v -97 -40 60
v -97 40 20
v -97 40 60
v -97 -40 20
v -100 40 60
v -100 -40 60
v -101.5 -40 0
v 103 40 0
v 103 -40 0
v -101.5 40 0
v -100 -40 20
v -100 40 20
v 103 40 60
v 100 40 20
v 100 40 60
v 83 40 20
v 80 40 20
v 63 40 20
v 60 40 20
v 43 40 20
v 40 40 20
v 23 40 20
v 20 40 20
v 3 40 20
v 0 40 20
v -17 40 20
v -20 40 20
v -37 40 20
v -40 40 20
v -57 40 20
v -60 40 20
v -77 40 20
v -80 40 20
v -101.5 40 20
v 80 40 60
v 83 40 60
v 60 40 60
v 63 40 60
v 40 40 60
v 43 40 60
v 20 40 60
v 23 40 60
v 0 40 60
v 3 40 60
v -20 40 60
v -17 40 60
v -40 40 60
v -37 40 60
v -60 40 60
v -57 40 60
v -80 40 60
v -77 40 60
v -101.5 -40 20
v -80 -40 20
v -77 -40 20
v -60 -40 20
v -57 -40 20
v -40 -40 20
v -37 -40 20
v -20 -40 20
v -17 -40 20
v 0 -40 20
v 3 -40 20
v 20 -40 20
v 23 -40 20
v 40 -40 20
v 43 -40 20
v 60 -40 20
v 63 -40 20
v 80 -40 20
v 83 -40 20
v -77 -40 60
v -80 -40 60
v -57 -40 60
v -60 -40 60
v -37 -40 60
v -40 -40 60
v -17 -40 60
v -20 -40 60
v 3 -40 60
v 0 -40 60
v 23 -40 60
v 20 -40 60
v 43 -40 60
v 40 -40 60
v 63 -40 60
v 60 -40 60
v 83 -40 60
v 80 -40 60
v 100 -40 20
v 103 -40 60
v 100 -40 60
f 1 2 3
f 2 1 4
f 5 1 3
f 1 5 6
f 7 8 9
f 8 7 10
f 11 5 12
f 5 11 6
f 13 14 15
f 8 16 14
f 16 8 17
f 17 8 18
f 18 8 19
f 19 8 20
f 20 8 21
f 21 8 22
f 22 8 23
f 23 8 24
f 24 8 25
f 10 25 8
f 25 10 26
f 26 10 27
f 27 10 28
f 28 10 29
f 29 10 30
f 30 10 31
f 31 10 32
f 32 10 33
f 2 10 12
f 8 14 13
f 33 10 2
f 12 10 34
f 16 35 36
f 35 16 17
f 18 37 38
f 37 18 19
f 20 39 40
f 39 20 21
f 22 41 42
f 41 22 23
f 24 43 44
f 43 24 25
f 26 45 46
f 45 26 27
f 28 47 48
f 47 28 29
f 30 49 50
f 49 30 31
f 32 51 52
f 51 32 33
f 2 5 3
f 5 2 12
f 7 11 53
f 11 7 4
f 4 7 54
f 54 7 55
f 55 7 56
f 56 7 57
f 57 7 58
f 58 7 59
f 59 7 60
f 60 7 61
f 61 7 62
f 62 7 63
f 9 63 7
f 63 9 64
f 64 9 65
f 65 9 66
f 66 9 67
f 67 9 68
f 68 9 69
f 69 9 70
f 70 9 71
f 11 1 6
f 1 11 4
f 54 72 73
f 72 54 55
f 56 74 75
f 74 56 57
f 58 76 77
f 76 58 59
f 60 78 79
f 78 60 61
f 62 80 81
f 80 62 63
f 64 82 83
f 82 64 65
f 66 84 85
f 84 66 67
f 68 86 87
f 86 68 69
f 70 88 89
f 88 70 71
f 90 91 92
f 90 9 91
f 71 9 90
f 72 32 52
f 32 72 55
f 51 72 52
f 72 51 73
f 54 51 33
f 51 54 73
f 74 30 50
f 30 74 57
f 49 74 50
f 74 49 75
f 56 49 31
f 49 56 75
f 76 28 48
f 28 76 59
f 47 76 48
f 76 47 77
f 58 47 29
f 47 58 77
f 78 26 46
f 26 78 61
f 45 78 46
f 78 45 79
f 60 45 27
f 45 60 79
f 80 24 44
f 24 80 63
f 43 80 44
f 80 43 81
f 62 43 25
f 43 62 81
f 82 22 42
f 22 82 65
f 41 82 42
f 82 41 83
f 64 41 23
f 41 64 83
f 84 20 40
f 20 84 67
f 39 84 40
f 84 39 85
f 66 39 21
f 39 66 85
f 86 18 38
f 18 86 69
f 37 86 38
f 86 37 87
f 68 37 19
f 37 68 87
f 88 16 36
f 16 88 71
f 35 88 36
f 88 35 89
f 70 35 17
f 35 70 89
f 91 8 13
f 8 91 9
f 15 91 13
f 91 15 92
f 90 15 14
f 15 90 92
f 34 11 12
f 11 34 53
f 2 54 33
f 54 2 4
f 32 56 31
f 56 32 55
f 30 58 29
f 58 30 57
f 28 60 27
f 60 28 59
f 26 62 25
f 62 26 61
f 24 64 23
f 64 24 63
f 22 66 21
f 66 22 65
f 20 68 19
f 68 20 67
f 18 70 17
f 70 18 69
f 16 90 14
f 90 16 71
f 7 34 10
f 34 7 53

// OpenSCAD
// --- Parameters ---
// Base dimensions
base_length = 203;       // X dimension of the base
base_width = 80;         // Y dimension of the base
base_height = 20;        // Z dimension of the base

// Cradle dimensions (for 90mm Petri dish)
dish_radius = 46;        // Radius of the cylinder cutting the cradle
cradle_axis_y = 0;       // Y position of the cylinder axis
cradle_axis_z = 52;      // Z position of the cylinder axis
cradle_depth_offset = 1; // Extra depth for boolean subtraction

// Divider dimensions
num_dividers = 11;       // Number of vertical plates
divider_thickness = 3;   // Thickness of each divider (X direction)
divider_height = 60;     // Height of dividers (Z direction)
divider_width = 80;      // Width of dividers (Y direction)
divider_spacing = 20;    // Distance between divider centers (X direction)
divider_start_x = -100;  // Starting X position for the first divider

// Resolution
fn_val = 64;             // Smoothness for cylinders

// --- Implementation ---

// The part is built in the print orientation: rests on XY plane at Z=0.
// The base is centered on X and Y.

union() {
    // 1. The Base Block
    translate([-base_length/2, -base_width/2, 0])
        cube([base_length, base_width, base_height]);

    // 2. The Divider Plates
    // We use a loop to place 11 dividers.
    // The dividers are "solid", meaning they are not cut by the cradle.
    // To ensure the cradle doesn't cut through them, we place them in a union
    // with the base, but the cradle subtraction must happen AFTER or 
    // we must ensure the dividers are not part of the subtraction.
    // The prompt says "the cradle is not cut through them".
    // Therefore, we calculate the dividers separately and union them.
    
    for (i = [0 : num_dividers - 1]) {
        translate([divider_start_x + (i * divider_spacing), -divider_width/2, 0])
            cube([divider_thickness, divider_width, divider_height]);
    }
}

// 3. The Cradle Cutout
// The cradle is a cylinder subtracted from the assembly.
// To ensure the cradle does NOT cut through the dividers, we must 
// subtract the cradle ONLY from the base, or use a logic where 
// the dividers are added back. 
// However, the prompt says "the cradle is not cut through them".
// The most robust way to model this is to create the base, subtract the cradle,
// then union the dividers.

// Let's re-structure the logic to follow the prompt's physical description:
// "A curved cradle... is cut along its whole length... the cradle is not cut through [the dividers]"

// Corrected Modeling Strategy:
// Part = (Base - Cradle) + Dividers

// We will use a module to keep it clean.
// Since I cannot use modules to redefine the whole structure easily in one block 
// without repeating code, I will use a single difference() block for the base 
// and then union the dividers.

// RE-WRITING THE MAIN BLOCK FOR LOGICAL ACCURACY:

// We'll use a temporary variable approach to ensure the dividers are not cut.
// We define the base with the cradle cut out, then union the dividers.

// Note: The prompt says the base is 20mm tall, but the cradle bottoms out at z=6.
// This means the cradle cuts into the base.

// Final Construction:
// (Base - Cradle) UNION Dividers

difference() {
    // The Base
    translate([-base_length/2, -base_width/2, 0])
        cube([base_length, base_width, base_height]);
    
    // The Cradle (Cylinder)
    // Axis runs along X, so we rotate the cylinder.
    // Cylinder is infinite in X for the cut, so we make it longer than the base.
    translate([0, cradle_axis_y, cradle_axis_z])
        rotate([0, 90, 0])
            cylinder(h = base_length + 2, r = dish_radius, center = true, $fn = fn_val);
}

// Add the dividers on top of the base/cradle assembly
// They are placed from z=0 to z=60.
// Since they are "solid" and "the cradle is not cut through them", 
// they must be unioned AFTER the cradle is subtracted from the base.
// However, the dividers start at z=0. If they are "not cut", 
// they must exist as full blocks.

// Wait, if the dividers are "not cut through" by the cradle, 
// and the cradle is a groove in the base, the dividers must be 
// placed such that they are not affected by the subtraction.
// This means the dividers are unioned with the result of (Base - Cradle).

// But if the dividers are placed at x = -100, -80... 
// and the cradle is at z=52 (axis) with radius 46, the bottom of the cradle is 52-46 = 6.
// The dividers go from z=0 to z=60.
// If the dividers are not cut, they will "fill in" the groove where they intersect it.
// This is exactly what the prompt asks for: "This leaves ten 17 mm wide slots, one dish in each."
// This implies the dividers act as the walls of the slots.

// Let's refine the divider placement to ensure they are "solid".
// The code below follows: (Base - Cradle) + Dividers.

// Wait, the prompt says "Eleven solid divider plates... rise from z=0 to z=60".
// If they are not cut by the cradle, they will be continuous blocks.
// The cradle is cut from the base.
// If a divider is at x=-100, and the cradle passes through x=-100,
// and the divider is NOT cut, the divider will occupy the space where the cradle would be.
// This would block the dish.
// UNLESS the dividers are placed BETWEEN the slots.
// The prompt says: "This leaves ten 17 mm wide slots, one dish in each."
// This means the dividers are the walls.
// If the dividers are NOT cut by the cradle, they would block the dish.
// Therefore, the "not cut through them" must mean the dividers are 
// added to the base AFTER the cradle is cut, but the dividers themselves 
// are not subject to the subtraction. 
// BUT, if the dividers are not cut, they will block the groove.
// Let's re-read: "Eleven solid divider plates... rise from z=0 to z=60... the cradle is not cut through them."
// This is a contradiction if the dividers are meant to allow a dish to sit in a groove.
// UNLESS the dividers are placed such that they don't intersect the groove? 
// No, the groove is along the whole length.
// Let's look at the math: 
// Divider at x=-100. Cradle is at y=0, z=52, r=46. 
// The groove is a void. If the divider is "not cut", it fills the void.
// If the divider fills the void, you can't put a dish in.
// THE ONLY LOGICAL INTERPRETATION:
// The dividers are the walls, and the "not cut through them" means 
// the user wants the dividers to be solid blocks, and the cradle 
// is only cut from the base material, but the dividers are placed 
// in a way that they define the slots.
// Actually, the most common way to interpret "the cradle is not cut through them" 
// in CAD instructions is that the subtraction operation should not apply to the divider objects.
// If the dividers are not cut, they will be solid. 
// If they are solid and they intersect the cradle, they will fill the cradle.
// BUT, if the dividers are the *walls* of the slots, they shouldn't be in the middle of the slot.
// Let's check the spacing: 11 dividers, 20mm apart = 10 slots.
// Slot width = 20mm (center to center) - 3mm (divider) = 17mm.
// This matches the prompt! "This leaves ten 17 mm wide slots".
// So the dividers are the walls.
// If the dividers are the walls, they are at x = -100, -80, etc.
// The cradle is at y=0. The dividers are at y = -40 to 40.
//
